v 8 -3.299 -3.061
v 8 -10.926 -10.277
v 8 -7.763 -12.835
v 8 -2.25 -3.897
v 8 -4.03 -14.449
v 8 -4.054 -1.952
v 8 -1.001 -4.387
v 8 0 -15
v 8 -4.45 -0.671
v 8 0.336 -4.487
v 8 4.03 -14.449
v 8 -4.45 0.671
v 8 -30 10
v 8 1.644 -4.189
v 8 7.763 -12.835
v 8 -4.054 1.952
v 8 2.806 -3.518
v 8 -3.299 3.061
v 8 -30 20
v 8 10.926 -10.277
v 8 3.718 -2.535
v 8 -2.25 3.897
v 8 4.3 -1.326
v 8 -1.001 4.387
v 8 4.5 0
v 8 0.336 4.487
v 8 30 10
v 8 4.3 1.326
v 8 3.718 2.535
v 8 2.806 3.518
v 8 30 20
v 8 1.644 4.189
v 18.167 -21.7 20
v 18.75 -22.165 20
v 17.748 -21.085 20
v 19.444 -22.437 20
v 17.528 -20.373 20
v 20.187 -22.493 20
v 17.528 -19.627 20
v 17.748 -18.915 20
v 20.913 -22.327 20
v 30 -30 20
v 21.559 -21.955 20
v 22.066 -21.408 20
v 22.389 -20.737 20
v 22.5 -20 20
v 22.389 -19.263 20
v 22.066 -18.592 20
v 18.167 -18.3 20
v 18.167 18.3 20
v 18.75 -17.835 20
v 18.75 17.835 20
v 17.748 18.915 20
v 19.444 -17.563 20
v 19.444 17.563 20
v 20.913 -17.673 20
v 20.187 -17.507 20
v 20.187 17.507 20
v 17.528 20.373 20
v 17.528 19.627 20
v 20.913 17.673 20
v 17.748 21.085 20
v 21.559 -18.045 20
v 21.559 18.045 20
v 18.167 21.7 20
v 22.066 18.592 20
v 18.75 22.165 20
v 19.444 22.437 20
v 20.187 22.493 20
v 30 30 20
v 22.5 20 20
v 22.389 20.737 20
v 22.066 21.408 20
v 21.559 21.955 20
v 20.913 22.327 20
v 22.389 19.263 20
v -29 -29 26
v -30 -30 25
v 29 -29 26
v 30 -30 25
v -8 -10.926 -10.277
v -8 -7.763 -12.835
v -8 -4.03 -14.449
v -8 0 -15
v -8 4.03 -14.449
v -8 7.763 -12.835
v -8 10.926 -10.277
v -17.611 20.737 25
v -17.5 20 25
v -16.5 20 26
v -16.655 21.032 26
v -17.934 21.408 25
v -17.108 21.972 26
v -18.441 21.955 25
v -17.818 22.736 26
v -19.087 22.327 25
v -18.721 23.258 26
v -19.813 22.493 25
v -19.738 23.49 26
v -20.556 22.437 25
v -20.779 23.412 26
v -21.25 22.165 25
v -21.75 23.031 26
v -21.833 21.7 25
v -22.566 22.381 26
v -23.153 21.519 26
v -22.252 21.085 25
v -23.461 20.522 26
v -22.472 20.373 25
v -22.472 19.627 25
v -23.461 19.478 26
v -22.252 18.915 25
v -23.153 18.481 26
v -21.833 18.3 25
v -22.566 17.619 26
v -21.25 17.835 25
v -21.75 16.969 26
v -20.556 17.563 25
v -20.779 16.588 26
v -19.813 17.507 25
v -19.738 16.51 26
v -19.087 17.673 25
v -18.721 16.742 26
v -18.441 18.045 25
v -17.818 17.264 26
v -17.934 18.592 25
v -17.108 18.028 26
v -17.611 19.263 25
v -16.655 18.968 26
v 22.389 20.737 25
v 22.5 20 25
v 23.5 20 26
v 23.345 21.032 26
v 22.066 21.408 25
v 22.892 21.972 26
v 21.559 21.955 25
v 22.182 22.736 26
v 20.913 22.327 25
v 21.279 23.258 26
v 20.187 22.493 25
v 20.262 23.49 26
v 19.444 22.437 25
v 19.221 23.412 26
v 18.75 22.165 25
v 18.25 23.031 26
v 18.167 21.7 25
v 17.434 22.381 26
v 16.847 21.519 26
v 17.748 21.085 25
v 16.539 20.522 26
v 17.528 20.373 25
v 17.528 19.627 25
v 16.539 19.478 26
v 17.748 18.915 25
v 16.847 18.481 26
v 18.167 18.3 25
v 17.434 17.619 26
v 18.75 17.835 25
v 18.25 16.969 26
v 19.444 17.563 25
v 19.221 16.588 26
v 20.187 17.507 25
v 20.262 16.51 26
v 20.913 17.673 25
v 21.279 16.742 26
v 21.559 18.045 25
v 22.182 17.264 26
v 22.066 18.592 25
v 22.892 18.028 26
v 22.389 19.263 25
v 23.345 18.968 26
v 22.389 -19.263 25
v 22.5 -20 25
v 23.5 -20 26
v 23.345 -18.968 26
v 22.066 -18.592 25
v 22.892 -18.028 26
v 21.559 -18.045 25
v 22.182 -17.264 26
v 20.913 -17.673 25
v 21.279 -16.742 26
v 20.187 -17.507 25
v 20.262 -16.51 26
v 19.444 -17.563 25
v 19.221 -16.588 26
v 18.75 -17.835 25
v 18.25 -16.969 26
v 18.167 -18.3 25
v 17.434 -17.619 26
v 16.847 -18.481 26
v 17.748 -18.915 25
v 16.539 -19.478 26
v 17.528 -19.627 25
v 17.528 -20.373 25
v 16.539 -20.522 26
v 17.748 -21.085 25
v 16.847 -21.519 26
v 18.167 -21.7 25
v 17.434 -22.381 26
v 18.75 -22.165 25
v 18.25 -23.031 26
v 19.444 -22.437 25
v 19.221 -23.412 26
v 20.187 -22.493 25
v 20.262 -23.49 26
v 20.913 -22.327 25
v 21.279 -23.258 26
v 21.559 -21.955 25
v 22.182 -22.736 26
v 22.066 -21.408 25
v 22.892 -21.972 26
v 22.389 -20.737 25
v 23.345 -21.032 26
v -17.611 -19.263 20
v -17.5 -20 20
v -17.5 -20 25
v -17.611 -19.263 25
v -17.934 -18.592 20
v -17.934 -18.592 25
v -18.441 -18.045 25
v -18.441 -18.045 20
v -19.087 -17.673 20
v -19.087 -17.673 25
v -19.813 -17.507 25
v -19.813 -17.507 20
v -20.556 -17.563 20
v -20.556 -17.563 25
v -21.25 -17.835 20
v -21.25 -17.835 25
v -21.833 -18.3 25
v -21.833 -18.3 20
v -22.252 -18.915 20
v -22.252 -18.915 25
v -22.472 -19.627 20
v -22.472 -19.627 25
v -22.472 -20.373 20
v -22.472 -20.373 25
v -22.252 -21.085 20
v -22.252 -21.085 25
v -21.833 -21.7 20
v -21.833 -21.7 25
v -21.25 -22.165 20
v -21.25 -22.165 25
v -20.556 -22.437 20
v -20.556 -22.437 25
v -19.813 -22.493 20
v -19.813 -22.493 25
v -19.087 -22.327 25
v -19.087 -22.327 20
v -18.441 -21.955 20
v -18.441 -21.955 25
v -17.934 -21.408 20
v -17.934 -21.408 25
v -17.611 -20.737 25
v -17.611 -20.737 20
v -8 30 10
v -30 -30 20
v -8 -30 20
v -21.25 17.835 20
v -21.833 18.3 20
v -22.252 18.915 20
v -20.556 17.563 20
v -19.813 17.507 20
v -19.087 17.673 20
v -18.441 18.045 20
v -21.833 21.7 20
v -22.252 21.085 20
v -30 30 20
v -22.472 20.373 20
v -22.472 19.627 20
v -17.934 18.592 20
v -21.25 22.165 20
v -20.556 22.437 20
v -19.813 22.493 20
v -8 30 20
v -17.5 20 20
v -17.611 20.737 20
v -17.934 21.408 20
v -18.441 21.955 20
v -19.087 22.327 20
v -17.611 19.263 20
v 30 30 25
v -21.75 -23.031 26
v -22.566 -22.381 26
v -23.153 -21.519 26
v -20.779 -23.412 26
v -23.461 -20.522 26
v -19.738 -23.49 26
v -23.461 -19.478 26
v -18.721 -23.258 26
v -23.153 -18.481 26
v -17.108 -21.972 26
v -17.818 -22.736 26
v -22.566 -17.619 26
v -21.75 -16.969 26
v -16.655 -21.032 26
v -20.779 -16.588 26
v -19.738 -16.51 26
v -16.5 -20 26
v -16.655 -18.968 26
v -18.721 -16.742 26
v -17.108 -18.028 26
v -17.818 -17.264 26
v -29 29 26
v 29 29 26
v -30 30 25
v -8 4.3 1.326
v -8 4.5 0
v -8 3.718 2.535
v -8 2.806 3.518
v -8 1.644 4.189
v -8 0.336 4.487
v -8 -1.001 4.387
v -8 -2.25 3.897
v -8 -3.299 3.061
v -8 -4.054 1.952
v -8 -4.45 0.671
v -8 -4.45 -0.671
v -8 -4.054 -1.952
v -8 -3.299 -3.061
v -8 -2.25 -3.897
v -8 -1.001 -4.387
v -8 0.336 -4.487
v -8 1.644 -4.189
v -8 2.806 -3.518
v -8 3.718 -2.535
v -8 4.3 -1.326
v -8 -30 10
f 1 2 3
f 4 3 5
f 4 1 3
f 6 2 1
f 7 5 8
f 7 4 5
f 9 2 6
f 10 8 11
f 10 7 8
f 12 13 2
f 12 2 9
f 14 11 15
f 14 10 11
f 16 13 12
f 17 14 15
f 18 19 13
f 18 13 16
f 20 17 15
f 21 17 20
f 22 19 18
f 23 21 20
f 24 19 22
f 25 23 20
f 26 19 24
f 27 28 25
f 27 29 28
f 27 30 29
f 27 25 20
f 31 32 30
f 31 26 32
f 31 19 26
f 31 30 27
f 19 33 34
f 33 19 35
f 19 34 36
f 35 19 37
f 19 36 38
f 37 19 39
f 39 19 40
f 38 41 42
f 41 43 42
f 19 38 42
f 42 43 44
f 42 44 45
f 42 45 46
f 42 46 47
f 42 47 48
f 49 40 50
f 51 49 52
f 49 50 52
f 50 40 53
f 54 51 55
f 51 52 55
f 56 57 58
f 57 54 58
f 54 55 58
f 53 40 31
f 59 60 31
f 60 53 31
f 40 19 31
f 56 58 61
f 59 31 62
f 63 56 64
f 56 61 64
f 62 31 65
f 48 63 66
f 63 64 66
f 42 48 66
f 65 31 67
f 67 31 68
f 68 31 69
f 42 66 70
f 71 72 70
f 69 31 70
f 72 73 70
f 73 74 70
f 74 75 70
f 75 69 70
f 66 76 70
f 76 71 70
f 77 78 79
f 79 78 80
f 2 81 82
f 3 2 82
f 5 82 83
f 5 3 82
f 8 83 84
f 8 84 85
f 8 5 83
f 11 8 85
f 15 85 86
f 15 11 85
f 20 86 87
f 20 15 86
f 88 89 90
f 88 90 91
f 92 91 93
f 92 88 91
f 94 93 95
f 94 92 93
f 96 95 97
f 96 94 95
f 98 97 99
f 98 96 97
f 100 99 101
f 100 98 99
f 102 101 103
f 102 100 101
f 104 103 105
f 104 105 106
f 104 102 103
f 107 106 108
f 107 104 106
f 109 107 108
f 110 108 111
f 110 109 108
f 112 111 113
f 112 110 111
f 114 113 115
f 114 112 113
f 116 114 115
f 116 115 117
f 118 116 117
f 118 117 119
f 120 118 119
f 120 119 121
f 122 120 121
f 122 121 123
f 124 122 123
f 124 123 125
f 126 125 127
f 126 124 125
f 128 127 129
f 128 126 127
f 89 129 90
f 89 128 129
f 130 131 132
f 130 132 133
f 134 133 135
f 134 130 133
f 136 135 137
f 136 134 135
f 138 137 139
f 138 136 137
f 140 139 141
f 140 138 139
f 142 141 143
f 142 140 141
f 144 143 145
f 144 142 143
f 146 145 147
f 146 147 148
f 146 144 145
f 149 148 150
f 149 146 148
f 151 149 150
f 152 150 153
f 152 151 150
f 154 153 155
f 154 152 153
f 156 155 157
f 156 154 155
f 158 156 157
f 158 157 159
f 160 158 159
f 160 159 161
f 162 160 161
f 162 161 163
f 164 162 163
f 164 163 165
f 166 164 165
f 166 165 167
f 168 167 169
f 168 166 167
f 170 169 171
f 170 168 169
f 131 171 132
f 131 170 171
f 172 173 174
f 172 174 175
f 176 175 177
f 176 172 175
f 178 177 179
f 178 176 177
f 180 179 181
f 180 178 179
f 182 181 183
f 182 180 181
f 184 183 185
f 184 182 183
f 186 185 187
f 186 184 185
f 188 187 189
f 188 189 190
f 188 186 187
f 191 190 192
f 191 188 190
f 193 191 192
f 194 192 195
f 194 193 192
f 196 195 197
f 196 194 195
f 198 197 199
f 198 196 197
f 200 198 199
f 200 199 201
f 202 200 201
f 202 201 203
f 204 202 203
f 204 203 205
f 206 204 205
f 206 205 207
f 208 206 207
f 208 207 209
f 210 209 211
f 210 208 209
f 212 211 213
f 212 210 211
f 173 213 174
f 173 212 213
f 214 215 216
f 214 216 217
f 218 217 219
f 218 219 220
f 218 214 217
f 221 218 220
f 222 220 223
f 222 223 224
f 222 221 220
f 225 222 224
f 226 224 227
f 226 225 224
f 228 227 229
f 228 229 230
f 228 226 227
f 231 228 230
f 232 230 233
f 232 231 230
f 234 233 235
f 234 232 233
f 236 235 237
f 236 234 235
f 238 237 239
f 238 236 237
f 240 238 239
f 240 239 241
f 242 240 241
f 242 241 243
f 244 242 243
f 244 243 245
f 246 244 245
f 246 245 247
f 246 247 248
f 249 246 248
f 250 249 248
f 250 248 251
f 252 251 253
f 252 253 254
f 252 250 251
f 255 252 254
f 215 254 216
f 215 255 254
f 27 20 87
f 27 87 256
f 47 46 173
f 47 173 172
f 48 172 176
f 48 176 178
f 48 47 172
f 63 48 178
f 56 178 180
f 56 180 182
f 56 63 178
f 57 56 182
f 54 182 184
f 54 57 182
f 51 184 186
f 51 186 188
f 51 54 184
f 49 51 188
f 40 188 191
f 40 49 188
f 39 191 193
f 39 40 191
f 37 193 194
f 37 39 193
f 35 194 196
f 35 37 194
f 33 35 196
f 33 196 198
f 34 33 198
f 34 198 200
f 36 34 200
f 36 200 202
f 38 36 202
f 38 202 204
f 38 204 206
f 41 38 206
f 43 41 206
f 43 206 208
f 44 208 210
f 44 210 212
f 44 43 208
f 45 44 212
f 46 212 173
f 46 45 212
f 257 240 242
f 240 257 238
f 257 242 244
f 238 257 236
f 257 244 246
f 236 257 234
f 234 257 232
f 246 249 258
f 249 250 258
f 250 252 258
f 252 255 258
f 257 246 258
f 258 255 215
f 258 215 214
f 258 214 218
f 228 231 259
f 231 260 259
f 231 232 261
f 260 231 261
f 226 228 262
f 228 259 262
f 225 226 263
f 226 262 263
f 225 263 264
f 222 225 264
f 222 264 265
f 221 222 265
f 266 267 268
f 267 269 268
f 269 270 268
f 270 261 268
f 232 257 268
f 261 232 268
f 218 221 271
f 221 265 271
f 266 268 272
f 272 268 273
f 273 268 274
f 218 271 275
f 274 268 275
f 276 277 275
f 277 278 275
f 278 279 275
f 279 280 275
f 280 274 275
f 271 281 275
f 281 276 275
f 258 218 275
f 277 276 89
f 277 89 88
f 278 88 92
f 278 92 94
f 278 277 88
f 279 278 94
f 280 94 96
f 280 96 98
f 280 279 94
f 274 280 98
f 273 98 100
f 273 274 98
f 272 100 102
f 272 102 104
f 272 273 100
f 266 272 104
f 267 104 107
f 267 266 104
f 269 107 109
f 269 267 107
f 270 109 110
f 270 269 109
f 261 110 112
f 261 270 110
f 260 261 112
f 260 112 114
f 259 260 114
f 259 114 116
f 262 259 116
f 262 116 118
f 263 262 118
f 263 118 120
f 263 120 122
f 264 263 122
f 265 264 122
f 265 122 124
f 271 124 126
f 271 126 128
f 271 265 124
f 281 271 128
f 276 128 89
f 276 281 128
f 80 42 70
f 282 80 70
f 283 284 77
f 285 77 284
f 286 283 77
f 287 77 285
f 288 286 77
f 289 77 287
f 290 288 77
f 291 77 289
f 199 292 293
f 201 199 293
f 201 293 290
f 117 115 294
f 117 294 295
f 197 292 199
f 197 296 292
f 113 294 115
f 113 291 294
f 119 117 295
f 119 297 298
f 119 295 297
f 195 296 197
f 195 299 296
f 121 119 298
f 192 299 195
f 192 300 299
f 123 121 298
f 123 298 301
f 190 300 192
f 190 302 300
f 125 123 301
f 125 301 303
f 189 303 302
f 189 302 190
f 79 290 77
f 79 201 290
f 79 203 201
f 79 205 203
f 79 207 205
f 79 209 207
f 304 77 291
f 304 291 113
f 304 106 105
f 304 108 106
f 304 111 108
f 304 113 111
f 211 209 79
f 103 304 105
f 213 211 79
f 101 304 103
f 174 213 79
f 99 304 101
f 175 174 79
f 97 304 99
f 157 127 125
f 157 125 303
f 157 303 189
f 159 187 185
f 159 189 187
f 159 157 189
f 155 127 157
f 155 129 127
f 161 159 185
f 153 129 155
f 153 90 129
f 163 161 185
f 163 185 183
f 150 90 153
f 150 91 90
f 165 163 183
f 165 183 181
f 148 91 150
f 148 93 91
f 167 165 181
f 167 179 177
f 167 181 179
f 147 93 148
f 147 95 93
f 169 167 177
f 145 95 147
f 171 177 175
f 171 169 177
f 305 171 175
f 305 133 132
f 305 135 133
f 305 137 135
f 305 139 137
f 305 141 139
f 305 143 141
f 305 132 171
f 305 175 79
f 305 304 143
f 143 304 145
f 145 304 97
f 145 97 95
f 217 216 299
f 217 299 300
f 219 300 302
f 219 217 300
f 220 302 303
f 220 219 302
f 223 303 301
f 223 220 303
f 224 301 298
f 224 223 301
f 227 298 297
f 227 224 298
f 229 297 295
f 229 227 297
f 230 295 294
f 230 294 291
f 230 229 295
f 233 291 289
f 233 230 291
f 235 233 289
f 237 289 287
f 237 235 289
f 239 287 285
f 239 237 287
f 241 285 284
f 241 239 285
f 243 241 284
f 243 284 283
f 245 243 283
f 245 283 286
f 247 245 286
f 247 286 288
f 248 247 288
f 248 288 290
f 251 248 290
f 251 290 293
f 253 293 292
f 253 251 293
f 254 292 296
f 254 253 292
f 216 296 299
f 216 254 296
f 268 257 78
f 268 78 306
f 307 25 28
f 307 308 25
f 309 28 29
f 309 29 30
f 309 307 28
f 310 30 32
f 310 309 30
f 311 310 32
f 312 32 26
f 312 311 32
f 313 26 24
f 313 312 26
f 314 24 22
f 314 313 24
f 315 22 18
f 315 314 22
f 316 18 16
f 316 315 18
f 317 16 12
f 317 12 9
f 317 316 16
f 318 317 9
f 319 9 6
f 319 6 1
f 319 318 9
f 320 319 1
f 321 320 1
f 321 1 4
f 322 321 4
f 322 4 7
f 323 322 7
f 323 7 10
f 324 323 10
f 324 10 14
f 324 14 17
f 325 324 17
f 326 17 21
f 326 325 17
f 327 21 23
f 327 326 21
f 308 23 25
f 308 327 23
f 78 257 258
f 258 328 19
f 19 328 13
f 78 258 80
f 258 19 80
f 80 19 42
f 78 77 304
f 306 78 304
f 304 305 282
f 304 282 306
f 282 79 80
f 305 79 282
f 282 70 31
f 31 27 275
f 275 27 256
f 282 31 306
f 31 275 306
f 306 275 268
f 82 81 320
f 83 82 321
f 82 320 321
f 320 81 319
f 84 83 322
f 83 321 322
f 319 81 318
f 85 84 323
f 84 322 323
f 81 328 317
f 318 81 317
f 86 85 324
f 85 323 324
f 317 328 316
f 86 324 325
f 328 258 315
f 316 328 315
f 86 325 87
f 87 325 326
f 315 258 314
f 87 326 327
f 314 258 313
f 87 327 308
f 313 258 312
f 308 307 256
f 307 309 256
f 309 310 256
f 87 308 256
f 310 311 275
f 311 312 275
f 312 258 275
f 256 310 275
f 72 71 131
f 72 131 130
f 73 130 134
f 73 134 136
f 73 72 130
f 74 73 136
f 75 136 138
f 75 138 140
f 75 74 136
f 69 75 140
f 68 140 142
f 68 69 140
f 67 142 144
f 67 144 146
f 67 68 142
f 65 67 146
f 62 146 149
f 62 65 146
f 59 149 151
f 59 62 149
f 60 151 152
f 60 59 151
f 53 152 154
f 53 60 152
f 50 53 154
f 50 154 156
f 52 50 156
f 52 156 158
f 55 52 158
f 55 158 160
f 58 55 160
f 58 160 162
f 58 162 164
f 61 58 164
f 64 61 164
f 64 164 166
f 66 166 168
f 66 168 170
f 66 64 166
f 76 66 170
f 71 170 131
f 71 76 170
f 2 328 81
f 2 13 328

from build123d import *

# Parameters (mm, degrees)
F0_R     = 4.5
F1_DEPTH = 8
F2_W     = 22
F2_H     = 60
F2_R     = 2.5
F3_DEPTH = 6
F4_SIZE  = 1


with BuildPart() as f1:
    # F0 (on Right) → F1 (new body, symmetric)
    with BuildSketch(Plane.YZ):
        with BuildLine():
            Line((-30, 10), (-10.925823, -10.27747))
            ThreePointArc((-10.925823, -10.27747), (0, -15), (10.925823, -10.27747))
            Line((10.925823, -10.27747), (30, 10))
            Line((30, 10), (30, 20))
            Line((30, 20), (0, 20))
            Line((0, 20), (-30, 20))
            Line((-30, 20), (-30, 10))
        make_face()
        Circle(F0_R, mode=Mode.SUBTRACT)
    extrude(amount=F1_DEPTH, both=True)

    # F2 (on face) → F3 (join)
    with BuildSketch(Plane.XY.offset(20)):
        Polygon((8, 30), (0, 30), (-8, 30), (-8, -30), (8, -30), align=None)
        with Locations((19, 0)):
            Rectangle(F2_W, F2_H)
        with Locations((20, -20)):
            Circle(F2_R, mode=Mode.SUBTRACT)
        with Locations((20, 20)):
            Circle(F2_R, mode=Mode.SUBTRACT)
        with Locations((-19, 0)):
            Rectangle(F2_W, F2_H)
        with Locations((-20, -20)):
            Circle(F2_R, mode=Mode.SUBTRACT)
        with Locations((-20, 20)):
            Circle(F2_R, mode=Mode.SUBTRACT)
    extrude(amount=F3_DEPTH)

    # F4
    f4_edges = [f1.edges().sort_by_distance(p)[0] for p in [
        (0, 30, 26),
        (-30, 0, 26),
        (0, -30, 26),
        (30, 0, 26),
        (17.5, 20, 26),
        (17.5, -20, 26),
        (-22.5, 20, 26),
        (-22.5, -20, 26),
    ]]
    chamfer(f4_edges, length=F4_SIZE)


solid = f1.part
